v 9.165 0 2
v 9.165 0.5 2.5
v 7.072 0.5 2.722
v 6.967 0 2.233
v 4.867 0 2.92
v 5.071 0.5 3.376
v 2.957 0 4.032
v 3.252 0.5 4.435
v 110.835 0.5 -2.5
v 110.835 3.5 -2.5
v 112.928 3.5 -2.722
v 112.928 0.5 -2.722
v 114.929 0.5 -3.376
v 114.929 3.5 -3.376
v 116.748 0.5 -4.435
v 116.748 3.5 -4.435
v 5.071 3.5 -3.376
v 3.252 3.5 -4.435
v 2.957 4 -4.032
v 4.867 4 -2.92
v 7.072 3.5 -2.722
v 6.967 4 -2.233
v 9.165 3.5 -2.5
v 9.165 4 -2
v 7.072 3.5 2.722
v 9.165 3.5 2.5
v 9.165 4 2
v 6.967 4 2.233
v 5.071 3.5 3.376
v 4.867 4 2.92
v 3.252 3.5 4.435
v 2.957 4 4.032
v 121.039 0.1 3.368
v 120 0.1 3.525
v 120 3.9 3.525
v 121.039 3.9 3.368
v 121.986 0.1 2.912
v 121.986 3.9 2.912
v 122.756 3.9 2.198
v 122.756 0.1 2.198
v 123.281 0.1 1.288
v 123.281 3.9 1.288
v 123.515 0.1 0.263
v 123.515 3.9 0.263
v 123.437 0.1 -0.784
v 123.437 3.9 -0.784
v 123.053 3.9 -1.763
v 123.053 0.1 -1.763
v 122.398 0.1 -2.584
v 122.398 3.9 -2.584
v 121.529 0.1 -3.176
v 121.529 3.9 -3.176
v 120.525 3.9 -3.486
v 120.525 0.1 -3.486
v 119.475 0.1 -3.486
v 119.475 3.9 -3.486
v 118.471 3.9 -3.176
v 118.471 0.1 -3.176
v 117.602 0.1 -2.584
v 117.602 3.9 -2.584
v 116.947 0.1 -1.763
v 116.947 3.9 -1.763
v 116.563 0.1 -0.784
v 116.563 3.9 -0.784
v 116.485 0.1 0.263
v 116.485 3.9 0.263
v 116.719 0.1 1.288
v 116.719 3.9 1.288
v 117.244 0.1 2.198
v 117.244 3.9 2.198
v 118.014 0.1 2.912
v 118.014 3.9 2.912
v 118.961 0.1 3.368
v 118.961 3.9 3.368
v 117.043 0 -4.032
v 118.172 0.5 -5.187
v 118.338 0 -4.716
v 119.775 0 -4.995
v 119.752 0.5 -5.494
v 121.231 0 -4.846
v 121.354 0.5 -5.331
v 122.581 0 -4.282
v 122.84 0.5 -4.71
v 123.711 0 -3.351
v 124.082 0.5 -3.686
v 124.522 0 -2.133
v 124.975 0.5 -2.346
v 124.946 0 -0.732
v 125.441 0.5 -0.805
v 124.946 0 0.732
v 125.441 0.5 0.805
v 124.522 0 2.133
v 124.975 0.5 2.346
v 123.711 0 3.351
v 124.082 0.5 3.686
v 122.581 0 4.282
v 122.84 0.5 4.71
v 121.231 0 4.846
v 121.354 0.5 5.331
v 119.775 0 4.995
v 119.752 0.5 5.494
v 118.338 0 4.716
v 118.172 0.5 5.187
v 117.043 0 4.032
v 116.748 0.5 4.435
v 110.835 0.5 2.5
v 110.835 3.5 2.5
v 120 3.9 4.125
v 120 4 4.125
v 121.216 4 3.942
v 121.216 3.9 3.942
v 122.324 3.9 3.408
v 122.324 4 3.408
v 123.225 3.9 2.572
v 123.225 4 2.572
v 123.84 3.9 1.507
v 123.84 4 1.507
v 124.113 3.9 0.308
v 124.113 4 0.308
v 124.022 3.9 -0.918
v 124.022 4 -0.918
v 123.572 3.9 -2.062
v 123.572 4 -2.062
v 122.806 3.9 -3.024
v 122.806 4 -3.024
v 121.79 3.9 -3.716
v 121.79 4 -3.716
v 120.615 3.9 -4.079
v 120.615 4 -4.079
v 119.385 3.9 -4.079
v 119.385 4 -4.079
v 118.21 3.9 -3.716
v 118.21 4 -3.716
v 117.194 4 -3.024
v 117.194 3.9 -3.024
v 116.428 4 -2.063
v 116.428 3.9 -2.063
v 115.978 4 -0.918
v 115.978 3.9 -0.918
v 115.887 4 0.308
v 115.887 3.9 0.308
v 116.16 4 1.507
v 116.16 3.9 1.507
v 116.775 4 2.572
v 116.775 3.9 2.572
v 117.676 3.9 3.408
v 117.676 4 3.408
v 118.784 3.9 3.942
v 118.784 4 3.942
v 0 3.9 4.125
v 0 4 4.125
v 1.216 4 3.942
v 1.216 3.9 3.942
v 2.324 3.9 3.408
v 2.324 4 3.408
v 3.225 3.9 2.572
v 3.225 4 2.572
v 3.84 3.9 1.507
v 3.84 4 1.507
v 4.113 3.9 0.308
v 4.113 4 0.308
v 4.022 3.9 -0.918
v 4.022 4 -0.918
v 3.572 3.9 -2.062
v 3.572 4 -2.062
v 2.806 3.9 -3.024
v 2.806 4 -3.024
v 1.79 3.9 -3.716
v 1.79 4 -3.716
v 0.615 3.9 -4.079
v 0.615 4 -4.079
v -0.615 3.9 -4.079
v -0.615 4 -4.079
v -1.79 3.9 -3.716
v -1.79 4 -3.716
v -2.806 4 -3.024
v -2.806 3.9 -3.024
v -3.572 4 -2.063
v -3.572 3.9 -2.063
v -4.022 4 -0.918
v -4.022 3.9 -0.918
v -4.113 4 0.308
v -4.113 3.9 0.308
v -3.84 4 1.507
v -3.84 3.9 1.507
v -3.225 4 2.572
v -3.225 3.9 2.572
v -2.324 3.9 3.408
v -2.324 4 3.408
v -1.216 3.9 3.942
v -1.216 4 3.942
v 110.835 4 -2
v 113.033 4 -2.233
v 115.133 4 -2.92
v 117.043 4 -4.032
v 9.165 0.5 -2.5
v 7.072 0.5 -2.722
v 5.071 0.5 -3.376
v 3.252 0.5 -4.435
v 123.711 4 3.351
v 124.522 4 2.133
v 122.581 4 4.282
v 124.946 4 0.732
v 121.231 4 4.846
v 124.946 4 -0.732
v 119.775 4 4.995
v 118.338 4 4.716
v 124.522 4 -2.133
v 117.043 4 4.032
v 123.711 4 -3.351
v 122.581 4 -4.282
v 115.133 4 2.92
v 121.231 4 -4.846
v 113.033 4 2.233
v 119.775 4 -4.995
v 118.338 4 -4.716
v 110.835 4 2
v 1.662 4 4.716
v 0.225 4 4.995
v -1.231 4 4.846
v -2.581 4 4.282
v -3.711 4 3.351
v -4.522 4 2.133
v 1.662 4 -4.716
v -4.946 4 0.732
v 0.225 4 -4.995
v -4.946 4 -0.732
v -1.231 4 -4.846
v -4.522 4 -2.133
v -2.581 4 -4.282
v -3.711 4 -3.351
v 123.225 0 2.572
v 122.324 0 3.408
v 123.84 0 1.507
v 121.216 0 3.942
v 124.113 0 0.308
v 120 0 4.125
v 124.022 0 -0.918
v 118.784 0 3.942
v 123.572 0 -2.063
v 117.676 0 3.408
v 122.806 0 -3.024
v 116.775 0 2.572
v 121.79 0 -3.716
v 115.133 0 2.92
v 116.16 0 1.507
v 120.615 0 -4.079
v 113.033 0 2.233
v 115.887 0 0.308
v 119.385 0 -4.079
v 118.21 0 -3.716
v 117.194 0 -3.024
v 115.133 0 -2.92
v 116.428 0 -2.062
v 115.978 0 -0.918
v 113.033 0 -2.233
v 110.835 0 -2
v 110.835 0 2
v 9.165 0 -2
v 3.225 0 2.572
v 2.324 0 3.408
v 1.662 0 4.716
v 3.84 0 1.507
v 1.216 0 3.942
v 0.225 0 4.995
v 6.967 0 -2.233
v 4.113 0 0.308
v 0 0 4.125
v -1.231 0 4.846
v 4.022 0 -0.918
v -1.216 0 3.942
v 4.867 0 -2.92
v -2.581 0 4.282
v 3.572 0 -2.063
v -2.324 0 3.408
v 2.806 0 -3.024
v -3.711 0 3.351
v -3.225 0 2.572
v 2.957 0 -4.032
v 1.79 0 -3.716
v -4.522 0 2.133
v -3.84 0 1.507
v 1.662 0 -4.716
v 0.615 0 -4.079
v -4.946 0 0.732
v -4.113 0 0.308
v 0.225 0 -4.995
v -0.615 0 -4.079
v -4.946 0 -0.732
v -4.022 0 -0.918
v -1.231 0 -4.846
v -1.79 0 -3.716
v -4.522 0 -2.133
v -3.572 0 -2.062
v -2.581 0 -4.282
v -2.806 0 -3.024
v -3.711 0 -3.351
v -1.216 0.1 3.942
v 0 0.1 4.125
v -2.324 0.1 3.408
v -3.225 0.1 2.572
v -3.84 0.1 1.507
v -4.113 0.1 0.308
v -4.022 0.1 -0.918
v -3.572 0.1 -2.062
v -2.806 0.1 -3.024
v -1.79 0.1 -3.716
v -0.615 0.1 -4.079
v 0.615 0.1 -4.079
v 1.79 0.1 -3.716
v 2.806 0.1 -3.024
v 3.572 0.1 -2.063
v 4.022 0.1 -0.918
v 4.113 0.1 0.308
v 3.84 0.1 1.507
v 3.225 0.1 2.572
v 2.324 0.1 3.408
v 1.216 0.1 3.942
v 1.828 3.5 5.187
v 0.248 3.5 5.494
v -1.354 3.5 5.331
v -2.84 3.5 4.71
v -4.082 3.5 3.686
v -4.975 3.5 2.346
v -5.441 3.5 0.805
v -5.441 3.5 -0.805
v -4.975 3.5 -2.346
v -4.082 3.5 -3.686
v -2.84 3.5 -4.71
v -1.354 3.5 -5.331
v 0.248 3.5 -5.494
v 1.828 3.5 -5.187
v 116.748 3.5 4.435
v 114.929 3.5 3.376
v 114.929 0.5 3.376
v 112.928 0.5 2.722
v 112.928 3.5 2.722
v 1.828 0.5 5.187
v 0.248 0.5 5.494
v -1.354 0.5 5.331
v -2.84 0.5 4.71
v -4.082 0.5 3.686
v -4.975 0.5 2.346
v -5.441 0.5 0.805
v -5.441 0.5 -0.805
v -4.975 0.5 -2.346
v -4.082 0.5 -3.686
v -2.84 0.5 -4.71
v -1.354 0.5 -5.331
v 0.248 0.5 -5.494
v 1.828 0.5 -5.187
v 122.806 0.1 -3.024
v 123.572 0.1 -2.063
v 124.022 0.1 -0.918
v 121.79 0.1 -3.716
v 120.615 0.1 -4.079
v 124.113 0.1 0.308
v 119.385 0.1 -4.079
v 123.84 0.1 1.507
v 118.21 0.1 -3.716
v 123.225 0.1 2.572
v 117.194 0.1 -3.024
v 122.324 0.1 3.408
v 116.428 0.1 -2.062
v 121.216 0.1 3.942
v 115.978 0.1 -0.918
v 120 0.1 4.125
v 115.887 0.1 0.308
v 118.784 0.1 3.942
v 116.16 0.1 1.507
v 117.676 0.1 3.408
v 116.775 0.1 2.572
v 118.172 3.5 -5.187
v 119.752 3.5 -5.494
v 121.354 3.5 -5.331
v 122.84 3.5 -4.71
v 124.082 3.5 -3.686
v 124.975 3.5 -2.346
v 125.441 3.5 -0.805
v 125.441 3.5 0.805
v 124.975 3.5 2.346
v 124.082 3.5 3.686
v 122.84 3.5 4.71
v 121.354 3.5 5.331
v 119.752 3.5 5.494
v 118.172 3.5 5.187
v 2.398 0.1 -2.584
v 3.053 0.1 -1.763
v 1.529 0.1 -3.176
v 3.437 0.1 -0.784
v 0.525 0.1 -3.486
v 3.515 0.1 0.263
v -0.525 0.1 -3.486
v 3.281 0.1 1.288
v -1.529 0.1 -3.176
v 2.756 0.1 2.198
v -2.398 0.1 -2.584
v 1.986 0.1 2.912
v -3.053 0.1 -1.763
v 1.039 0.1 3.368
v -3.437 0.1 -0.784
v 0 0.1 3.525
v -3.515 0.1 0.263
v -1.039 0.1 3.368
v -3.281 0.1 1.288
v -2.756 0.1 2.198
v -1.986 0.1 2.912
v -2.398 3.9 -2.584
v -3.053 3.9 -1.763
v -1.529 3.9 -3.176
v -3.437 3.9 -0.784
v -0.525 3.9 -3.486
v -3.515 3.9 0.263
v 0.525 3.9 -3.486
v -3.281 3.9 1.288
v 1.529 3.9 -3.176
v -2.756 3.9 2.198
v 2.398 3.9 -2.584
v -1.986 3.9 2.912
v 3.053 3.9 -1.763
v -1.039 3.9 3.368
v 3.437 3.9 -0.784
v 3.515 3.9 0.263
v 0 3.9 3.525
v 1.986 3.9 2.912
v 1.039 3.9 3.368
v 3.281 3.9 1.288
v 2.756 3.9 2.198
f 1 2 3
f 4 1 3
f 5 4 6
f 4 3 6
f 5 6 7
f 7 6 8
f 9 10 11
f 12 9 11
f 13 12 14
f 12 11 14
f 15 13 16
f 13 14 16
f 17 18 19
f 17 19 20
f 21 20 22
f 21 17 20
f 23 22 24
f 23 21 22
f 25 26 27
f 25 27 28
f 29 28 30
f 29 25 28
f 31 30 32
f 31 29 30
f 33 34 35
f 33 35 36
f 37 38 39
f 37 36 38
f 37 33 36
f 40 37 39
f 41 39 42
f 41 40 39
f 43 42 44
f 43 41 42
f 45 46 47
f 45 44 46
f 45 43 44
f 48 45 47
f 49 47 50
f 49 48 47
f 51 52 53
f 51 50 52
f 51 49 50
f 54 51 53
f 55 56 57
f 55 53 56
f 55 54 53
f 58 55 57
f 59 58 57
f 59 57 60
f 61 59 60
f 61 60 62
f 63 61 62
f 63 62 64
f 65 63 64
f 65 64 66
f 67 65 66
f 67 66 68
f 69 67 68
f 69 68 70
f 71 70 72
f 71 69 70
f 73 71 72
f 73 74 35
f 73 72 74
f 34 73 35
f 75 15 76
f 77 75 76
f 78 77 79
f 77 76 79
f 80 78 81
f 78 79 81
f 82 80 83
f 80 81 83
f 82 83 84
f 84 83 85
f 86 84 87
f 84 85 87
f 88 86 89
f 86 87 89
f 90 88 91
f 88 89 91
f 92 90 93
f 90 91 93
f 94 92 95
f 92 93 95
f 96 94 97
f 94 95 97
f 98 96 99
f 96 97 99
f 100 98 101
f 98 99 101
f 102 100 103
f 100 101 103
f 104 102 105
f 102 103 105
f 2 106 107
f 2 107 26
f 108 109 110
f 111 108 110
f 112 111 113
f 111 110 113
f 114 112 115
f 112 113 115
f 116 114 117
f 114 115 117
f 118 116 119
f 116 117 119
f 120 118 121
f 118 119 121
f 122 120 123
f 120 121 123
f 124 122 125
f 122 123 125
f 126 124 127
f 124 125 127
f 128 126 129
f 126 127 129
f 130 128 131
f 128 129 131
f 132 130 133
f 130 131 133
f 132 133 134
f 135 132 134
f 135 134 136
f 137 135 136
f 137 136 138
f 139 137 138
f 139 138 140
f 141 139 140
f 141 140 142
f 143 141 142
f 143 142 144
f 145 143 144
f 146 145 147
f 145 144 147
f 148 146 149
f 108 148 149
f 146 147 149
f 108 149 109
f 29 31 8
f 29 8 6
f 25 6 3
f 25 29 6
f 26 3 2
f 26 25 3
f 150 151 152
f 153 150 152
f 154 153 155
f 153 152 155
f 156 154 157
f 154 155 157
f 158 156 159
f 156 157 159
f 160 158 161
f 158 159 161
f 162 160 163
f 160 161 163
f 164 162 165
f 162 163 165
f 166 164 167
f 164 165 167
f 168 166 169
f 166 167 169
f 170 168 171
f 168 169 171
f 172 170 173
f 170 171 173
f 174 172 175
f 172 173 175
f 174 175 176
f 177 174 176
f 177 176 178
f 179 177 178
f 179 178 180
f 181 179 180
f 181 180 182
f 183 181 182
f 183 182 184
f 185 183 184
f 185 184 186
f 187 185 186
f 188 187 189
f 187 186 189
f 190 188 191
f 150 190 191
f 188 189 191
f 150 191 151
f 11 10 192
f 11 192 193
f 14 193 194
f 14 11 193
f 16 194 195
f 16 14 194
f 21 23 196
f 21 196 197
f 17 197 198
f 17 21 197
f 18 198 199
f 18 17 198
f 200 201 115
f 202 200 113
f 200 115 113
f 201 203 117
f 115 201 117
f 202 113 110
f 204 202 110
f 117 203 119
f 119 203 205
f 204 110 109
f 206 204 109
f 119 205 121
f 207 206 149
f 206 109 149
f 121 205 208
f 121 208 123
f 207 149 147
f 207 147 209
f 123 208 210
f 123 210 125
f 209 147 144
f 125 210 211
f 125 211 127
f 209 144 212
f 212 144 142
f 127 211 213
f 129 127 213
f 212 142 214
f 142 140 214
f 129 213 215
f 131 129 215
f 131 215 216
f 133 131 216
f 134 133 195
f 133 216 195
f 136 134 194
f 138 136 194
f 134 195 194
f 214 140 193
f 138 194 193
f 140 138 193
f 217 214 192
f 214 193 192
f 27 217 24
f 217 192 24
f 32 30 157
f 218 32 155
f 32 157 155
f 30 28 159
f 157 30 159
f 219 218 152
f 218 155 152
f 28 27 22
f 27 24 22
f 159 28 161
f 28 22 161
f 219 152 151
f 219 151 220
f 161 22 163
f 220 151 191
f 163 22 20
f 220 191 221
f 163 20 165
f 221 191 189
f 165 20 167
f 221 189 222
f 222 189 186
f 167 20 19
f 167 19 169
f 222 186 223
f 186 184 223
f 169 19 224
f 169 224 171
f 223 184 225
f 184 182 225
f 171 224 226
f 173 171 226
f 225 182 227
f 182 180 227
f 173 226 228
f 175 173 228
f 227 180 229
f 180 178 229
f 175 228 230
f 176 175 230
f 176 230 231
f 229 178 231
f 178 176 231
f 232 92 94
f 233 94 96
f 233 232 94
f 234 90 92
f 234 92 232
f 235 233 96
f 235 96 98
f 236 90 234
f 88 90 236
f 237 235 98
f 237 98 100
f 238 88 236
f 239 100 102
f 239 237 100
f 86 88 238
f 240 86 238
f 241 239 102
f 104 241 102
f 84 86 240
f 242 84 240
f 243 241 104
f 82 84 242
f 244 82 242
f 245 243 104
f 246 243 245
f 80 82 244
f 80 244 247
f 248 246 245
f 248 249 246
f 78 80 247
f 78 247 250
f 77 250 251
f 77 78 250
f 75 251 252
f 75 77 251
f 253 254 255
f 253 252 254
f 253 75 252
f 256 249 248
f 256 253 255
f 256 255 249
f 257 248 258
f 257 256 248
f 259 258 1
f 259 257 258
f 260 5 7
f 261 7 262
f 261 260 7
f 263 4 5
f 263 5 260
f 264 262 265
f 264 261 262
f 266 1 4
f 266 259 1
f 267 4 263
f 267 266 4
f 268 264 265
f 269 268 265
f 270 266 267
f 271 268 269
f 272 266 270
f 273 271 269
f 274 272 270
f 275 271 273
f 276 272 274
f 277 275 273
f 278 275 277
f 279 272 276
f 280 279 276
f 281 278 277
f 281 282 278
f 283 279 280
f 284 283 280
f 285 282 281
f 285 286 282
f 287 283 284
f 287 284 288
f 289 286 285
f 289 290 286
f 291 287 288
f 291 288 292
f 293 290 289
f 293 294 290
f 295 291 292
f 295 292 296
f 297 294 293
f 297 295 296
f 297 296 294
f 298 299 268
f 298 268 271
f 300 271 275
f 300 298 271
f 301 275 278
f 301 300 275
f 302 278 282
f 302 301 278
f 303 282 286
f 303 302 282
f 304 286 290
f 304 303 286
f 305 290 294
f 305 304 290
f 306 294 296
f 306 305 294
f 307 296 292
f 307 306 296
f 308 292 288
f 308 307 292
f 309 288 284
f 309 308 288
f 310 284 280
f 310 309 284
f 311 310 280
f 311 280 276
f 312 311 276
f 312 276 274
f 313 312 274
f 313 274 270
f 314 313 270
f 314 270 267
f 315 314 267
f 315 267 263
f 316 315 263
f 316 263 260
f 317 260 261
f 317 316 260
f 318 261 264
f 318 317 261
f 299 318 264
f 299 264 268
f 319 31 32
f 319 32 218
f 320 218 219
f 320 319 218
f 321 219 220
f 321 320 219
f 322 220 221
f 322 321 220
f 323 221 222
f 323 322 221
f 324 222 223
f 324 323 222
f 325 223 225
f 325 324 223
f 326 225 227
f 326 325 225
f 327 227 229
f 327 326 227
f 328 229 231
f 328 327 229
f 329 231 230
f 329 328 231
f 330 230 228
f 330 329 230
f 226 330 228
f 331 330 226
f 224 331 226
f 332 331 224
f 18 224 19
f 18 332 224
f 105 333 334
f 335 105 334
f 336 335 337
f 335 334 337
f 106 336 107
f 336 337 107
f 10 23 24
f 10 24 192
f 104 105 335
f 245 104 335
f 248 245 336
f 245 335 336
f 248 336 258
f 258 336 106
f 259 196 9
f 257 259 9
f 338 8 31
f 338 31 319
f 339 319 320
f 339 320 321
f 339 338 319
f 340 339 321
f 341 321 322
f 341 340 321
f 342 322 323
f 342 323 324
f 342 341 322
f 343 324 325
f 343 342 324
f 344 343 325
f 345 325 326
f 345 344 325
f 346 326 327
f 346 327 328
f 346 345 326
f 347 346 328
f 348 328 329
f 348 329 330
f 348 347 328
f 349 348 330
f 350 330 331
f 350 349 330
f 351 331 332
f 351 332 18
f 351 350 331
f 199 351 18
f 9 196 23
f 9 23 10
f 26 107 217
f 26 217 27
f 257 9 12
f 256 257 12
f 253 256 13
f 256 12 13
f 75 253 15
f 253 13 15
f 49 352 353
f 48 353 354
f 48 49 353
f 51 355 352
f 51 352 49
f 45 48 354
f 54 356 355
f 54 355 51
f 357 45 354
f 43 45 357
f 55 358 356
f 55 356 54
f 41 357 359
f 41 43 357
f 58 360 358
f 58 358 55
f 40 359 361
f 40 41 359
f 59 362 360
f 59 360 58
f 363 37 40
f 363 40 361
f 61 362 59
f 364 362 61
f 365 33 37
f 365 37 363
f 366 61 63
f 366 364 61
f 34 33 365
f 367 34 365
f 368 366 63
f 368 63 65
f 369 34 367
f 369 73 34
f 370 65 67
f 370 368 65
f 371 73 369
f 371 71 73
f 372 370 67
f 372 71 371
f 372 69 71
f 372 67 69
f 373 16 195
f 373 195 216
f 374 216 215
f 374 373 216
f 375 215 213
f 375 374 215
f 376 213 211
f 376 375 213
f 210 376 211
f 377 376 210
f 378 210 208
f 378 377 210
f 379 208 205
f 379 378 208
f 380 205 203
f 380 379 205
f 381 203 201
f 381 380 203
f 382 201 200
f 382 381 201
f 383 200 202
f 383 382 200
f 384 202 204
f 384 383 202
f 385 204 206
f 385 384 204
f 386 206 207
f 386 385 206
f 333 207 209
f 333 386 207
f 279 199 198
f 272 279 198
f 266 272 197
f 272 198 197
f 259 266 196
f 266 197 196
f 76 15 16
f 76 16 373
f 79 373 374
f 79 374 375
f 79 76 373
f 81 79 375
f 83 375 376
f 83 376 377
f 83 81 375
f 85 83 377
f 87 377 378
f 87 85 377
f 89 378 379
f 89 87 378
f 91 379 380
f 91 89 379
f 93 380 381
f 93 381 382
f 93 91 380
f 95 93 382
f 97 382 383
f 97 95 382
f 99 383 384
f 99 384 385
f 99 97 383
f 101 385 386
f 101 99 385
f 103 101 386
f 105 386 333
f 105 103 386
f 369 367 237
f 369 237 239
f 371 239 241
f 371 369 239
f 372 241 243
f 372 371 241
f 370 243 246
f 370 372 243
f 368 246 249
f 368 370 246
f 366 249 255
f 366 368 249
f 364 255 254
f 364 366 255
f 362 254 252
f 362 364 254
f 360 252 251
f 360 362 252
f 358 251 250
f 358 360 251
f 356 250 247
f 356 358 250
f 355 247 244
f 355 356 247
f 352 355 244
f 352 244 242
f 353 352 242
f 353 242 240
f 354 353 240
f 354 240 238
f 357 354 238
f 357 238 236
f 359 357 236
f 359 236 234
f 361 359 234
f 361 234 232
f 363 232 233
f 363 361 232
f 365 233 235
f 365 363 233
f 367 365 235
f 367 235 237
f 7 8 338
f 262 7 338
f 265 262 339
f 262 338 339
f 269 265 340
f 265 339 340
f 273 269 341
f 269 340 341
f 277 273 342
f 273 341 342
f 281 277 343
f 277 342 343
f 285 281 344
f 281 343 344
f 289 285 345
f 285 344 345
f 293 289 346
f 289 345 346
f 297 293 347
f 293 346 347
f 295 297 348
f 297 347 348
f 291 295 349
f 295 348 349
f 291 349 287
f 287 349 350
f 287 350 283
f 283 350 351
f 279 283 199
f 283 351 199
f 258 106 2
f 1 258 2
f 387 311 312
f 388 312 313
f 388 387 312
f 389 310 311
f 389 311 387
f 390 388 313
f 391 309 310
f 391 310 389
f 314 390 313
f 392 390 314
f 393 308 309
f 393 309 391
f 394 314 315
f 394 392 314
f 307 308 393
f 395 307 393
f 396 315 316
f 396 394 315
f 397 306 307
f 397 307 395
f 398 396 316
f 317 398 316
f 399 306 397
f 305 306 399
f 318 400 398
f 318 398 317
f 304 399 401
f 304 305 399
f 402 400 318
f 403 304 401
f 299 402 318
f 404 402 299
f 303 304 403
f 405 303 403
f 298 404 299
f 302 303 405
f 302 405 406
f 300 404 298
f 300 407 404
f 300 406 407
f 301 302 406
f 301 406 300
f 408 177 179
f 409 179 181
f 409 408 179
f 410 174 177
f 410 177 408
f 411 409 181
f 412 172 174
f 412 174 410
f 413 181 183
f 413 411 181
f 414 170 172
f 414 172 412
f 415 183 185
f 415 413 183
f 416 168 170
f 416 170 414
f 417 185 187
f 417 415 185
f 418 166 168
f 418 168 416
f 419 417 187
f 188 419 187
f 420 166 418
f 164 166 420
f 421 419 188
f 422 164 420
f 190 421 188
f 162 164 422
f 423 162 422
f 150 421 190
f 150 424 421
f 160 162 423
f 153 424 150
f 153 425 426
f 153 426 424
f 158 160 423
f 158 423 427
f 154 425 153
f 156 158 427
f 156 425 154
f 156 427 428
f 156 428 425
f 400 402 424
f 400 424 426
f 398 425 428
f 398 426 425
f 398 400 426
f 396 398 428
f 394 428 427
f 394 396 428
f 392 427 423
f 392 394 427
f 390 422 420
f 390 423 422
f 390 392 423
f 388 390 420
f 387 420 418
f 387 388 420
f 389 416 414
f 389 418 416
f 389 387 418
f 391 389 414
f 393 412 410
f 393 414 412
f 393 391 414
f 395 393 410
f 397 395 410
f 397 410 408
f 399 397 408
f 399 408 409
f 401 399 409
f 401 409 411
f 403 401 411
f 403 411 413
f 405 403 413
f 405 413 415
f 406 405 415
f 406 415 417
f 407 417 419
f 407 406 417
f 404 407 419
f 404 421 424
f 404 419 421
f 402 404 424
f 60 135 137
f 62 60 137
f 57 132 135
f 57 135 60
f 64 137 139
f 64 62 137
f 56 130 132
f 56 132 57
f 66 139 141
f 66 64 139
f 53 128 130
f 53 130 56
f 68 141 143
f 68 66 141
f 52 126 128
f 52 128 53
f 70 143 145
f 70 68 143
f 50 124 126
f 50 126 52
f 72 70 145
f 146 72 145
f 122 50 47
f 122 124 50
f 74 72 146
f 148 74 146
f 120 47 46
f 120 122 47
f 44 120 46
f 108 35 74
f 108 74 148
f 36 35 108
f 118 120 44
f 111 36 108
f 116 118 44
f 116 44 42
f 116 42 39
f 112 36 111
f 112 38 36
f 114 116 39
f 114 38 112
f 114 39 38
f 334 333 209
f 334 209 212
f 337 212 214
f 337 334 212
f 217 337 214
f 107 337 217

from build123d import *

# Parameters (mm, degrees)
SKETCH_1_R          = 3.525
EXTRUDE_1_DEPTH     = 4
FILLET_1_R          = 10
CHAMFER_1_SIZE      = 0.5
SKETCH_3_R          = 4.125
CUT_EXTRUDE_2_DEPTH = 0.1
CUT_EXTRUDE_START   = -0.1
SKETCH_4_R          = 4.125
CUT_EXTRUDE_3_DEPTH = 0.1


with BuildPart() as part:
    # 草图1 → 凸台-拉伸1 (new body)
    with BuildSketch(Plane(origin=(0, 0, 0), x_dir=(1, 0, 0), z_dir=(0, 1, 0))):
        with BuildLine():
            Line((4.898979486, 2.5), (115.101020514, 2.5))
            ThreePointArc((115.101020514, 2.5), (125.5, 0), (115.101020514, -2.5))
            Line((115.101020514, -2.5), (4.898979486, -2.5))
            ThreePointArc((4.898979486, -2.5), (-5.5, 0), (4.898979486, 2.5))
        make_face()
        with Locations(Location((0, 0, 0), (0, 0, 270))):
            Circle(SKETCH_1_R, mode=Mode.SUBTRACT)
        with Locations(Location((120, 0, 0), (0, 0, 270))):
            Circle(SKETCH_1_R, mode=Mode.SUBTRACT)
    extrude(amount=EXTRUDE_1_DEPTH)

    # 圆角1
    fillet_1_edges = [part.edges().sort_by_distance(p)[0] for p in [
        (4.898979486, 2, -2.5),
        (115.101020514, 2, -2.5),
        (115.101020514, 2, 2.5),
        (4.898979486, 2, 2.5),
    ]]
    fillet(fillet_1_edges, radius=FILLET_1_R)

    # 倒角1
    chamfer_1_edges = [part.edges().sort_by_distance(p)[0] for p in [
        (125.5, 0, 0),
        (125.5, 4, 0),
        (60, 0, 2.5),
        (60, 4, 2.5),
        (60, 0, -2.5),
        (60, 4, -2.5),
        (-5.5, 0, 0),
        (-5.5, 4, 0),
        (113.945703694, 0, 2.996180734),
        (113.945703694, 4, 2.996180734),
        (113.945703694, 0, -2.996180734),
        (113.945703694, 4, -2.996180734),
        (6.054296306, 0, 2.996180734),
        (6.054296306, 4, 2.996180734),
        (6.054296306, 0, -2.996180734),
        (6.054296306, 4, -2.996180734),
    ]]
    chamfer(chamfer_1_edges, length=CHAMFER_1_SIZE)

    # 草图3 → 切除-拉伸2 (cut)
    with BuildSketch(Plane(origin=(0, 4, 0), x_dir=(1, 0, 0), z_dir=(0, 1, 0))):
        with Locations(Location((0, 0, 0), (0, 0, 270))):
            Circle(SKETCH_3_R)
        with Locations(Location((120, 0, 0), (0, 0, 270))):
            Circle(SKETCH_3_R)
    extrude(amount=-CUT_EXTRUDE_2_DEPTH, mode=Mode.SUBTRACT)

    # 草图4 → 切除-拉伸3 (cut)
    with BuildSketch(Plane.XZ.offset(CUT_EXTRUDE_START)):
        with Locations(Location((0, 0, 0), (0, 0, 90))):
            Circle(SKETCH_4_R)
        with Locations(Location((120, 0, 0), (0, 0, 90))):
            Circle(SKETCH_4_R)
    extrude(amount=CUT_EXTRUDE_3_DEPTH, mode=Mode.SUBTRACT)


solid = part.part
